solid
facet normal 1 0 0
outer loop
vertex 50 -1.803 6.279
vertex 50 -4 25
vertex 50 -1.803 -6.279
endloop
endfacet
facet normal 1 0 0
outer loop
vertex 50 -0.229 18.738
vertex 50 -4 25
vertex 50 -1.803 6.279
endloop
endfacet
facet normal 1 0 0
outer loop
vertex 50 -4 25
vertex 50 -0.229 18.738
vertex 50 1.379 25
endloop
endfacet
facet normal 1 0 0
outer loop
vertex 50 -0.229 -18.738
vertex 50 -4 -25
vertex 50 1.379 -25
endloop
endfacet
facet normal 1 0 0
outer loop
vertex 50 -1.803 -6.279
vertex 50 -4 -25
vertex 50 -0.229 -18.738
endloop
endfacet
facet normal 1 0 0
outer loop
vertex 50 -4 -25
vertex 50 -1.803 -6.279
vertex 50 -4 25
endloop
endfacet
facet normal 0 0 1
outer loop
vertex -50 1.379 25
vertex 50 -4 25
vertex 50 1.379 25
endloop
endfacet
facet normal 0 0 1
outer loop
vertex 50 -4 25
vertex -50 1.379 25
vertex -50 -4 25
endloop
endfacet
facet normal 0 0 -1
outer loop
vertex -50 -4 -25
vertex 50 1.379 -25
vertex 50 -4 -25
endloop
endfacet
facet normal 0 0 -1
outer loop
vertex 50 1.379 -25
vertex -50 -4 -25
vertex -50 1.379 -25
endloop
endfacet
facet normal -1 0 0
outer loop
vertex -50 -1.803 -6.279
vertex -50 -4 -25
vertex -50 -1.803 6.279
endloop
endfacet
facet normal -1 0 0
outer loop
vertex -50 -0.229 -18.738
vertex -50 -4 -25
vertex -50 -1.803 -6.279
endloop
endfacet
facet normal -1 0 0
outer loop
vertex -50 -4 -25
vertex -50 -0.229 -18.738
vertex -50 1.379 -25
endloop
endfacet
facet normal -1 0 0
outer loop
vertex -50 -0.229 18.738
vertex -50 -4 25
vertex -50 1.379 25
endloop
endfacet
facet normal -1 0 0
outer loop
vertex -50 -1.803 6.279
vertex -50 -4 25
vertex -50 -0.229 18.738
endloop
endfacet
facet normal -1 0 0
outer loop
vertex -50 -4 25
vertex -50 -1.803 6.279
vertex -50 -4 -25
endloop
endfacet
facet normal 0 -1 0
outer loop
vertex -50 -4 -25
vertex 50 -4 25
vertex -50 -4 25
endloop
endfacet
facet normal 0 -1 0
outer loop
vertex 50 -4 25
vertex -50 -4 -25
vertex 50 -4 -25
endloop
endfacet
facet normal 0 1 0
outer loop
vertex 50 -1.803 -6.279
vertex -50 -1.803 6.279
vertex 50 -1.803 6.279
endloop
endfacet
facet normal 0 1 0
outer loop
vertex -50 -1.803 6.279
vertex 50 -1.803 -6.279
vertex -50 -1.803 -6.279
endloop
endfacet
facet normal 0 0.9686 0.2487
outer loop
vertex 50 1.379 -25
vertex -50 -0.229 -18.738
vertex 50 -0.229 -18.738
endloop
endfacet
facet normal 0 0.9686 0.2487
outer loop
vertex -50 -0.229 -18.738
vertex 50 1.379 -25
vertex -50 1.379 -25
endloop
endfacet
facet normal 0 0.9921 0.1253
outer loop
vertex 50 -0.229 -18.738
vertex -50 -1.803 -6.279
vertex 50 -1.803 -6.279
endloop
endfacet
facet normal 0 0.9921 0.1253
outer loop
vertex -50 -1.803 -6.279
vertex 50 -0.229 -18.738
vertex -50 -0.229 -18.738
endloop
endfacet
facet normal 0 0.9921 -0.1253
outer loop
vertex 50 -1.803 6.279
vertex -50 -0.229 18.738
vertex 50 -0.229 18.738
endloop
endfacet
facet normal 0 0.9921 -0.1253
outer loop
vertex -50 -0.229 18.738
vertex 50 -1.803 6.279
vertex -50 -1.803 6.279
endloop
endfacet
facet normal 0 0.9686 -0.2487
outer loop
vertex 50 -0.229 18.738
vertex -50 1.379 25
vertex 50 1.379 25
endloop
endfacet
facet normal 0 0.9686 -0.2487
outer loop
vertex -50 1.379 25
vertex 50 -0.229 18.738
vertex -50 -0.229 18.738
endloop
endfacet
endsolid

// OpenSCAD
$fn =50;
Diameter_in_Millimeters=100;
difference() {
translate([0, 6, 0]) { cube([100, 20, 50], center=true); }
translate([-51,Diameter_in_Millimeters-2,0]) { rotate([0, 90, 0]) { cylinder(h = 102, r = Diameter_in_Millimeters); } }
}
